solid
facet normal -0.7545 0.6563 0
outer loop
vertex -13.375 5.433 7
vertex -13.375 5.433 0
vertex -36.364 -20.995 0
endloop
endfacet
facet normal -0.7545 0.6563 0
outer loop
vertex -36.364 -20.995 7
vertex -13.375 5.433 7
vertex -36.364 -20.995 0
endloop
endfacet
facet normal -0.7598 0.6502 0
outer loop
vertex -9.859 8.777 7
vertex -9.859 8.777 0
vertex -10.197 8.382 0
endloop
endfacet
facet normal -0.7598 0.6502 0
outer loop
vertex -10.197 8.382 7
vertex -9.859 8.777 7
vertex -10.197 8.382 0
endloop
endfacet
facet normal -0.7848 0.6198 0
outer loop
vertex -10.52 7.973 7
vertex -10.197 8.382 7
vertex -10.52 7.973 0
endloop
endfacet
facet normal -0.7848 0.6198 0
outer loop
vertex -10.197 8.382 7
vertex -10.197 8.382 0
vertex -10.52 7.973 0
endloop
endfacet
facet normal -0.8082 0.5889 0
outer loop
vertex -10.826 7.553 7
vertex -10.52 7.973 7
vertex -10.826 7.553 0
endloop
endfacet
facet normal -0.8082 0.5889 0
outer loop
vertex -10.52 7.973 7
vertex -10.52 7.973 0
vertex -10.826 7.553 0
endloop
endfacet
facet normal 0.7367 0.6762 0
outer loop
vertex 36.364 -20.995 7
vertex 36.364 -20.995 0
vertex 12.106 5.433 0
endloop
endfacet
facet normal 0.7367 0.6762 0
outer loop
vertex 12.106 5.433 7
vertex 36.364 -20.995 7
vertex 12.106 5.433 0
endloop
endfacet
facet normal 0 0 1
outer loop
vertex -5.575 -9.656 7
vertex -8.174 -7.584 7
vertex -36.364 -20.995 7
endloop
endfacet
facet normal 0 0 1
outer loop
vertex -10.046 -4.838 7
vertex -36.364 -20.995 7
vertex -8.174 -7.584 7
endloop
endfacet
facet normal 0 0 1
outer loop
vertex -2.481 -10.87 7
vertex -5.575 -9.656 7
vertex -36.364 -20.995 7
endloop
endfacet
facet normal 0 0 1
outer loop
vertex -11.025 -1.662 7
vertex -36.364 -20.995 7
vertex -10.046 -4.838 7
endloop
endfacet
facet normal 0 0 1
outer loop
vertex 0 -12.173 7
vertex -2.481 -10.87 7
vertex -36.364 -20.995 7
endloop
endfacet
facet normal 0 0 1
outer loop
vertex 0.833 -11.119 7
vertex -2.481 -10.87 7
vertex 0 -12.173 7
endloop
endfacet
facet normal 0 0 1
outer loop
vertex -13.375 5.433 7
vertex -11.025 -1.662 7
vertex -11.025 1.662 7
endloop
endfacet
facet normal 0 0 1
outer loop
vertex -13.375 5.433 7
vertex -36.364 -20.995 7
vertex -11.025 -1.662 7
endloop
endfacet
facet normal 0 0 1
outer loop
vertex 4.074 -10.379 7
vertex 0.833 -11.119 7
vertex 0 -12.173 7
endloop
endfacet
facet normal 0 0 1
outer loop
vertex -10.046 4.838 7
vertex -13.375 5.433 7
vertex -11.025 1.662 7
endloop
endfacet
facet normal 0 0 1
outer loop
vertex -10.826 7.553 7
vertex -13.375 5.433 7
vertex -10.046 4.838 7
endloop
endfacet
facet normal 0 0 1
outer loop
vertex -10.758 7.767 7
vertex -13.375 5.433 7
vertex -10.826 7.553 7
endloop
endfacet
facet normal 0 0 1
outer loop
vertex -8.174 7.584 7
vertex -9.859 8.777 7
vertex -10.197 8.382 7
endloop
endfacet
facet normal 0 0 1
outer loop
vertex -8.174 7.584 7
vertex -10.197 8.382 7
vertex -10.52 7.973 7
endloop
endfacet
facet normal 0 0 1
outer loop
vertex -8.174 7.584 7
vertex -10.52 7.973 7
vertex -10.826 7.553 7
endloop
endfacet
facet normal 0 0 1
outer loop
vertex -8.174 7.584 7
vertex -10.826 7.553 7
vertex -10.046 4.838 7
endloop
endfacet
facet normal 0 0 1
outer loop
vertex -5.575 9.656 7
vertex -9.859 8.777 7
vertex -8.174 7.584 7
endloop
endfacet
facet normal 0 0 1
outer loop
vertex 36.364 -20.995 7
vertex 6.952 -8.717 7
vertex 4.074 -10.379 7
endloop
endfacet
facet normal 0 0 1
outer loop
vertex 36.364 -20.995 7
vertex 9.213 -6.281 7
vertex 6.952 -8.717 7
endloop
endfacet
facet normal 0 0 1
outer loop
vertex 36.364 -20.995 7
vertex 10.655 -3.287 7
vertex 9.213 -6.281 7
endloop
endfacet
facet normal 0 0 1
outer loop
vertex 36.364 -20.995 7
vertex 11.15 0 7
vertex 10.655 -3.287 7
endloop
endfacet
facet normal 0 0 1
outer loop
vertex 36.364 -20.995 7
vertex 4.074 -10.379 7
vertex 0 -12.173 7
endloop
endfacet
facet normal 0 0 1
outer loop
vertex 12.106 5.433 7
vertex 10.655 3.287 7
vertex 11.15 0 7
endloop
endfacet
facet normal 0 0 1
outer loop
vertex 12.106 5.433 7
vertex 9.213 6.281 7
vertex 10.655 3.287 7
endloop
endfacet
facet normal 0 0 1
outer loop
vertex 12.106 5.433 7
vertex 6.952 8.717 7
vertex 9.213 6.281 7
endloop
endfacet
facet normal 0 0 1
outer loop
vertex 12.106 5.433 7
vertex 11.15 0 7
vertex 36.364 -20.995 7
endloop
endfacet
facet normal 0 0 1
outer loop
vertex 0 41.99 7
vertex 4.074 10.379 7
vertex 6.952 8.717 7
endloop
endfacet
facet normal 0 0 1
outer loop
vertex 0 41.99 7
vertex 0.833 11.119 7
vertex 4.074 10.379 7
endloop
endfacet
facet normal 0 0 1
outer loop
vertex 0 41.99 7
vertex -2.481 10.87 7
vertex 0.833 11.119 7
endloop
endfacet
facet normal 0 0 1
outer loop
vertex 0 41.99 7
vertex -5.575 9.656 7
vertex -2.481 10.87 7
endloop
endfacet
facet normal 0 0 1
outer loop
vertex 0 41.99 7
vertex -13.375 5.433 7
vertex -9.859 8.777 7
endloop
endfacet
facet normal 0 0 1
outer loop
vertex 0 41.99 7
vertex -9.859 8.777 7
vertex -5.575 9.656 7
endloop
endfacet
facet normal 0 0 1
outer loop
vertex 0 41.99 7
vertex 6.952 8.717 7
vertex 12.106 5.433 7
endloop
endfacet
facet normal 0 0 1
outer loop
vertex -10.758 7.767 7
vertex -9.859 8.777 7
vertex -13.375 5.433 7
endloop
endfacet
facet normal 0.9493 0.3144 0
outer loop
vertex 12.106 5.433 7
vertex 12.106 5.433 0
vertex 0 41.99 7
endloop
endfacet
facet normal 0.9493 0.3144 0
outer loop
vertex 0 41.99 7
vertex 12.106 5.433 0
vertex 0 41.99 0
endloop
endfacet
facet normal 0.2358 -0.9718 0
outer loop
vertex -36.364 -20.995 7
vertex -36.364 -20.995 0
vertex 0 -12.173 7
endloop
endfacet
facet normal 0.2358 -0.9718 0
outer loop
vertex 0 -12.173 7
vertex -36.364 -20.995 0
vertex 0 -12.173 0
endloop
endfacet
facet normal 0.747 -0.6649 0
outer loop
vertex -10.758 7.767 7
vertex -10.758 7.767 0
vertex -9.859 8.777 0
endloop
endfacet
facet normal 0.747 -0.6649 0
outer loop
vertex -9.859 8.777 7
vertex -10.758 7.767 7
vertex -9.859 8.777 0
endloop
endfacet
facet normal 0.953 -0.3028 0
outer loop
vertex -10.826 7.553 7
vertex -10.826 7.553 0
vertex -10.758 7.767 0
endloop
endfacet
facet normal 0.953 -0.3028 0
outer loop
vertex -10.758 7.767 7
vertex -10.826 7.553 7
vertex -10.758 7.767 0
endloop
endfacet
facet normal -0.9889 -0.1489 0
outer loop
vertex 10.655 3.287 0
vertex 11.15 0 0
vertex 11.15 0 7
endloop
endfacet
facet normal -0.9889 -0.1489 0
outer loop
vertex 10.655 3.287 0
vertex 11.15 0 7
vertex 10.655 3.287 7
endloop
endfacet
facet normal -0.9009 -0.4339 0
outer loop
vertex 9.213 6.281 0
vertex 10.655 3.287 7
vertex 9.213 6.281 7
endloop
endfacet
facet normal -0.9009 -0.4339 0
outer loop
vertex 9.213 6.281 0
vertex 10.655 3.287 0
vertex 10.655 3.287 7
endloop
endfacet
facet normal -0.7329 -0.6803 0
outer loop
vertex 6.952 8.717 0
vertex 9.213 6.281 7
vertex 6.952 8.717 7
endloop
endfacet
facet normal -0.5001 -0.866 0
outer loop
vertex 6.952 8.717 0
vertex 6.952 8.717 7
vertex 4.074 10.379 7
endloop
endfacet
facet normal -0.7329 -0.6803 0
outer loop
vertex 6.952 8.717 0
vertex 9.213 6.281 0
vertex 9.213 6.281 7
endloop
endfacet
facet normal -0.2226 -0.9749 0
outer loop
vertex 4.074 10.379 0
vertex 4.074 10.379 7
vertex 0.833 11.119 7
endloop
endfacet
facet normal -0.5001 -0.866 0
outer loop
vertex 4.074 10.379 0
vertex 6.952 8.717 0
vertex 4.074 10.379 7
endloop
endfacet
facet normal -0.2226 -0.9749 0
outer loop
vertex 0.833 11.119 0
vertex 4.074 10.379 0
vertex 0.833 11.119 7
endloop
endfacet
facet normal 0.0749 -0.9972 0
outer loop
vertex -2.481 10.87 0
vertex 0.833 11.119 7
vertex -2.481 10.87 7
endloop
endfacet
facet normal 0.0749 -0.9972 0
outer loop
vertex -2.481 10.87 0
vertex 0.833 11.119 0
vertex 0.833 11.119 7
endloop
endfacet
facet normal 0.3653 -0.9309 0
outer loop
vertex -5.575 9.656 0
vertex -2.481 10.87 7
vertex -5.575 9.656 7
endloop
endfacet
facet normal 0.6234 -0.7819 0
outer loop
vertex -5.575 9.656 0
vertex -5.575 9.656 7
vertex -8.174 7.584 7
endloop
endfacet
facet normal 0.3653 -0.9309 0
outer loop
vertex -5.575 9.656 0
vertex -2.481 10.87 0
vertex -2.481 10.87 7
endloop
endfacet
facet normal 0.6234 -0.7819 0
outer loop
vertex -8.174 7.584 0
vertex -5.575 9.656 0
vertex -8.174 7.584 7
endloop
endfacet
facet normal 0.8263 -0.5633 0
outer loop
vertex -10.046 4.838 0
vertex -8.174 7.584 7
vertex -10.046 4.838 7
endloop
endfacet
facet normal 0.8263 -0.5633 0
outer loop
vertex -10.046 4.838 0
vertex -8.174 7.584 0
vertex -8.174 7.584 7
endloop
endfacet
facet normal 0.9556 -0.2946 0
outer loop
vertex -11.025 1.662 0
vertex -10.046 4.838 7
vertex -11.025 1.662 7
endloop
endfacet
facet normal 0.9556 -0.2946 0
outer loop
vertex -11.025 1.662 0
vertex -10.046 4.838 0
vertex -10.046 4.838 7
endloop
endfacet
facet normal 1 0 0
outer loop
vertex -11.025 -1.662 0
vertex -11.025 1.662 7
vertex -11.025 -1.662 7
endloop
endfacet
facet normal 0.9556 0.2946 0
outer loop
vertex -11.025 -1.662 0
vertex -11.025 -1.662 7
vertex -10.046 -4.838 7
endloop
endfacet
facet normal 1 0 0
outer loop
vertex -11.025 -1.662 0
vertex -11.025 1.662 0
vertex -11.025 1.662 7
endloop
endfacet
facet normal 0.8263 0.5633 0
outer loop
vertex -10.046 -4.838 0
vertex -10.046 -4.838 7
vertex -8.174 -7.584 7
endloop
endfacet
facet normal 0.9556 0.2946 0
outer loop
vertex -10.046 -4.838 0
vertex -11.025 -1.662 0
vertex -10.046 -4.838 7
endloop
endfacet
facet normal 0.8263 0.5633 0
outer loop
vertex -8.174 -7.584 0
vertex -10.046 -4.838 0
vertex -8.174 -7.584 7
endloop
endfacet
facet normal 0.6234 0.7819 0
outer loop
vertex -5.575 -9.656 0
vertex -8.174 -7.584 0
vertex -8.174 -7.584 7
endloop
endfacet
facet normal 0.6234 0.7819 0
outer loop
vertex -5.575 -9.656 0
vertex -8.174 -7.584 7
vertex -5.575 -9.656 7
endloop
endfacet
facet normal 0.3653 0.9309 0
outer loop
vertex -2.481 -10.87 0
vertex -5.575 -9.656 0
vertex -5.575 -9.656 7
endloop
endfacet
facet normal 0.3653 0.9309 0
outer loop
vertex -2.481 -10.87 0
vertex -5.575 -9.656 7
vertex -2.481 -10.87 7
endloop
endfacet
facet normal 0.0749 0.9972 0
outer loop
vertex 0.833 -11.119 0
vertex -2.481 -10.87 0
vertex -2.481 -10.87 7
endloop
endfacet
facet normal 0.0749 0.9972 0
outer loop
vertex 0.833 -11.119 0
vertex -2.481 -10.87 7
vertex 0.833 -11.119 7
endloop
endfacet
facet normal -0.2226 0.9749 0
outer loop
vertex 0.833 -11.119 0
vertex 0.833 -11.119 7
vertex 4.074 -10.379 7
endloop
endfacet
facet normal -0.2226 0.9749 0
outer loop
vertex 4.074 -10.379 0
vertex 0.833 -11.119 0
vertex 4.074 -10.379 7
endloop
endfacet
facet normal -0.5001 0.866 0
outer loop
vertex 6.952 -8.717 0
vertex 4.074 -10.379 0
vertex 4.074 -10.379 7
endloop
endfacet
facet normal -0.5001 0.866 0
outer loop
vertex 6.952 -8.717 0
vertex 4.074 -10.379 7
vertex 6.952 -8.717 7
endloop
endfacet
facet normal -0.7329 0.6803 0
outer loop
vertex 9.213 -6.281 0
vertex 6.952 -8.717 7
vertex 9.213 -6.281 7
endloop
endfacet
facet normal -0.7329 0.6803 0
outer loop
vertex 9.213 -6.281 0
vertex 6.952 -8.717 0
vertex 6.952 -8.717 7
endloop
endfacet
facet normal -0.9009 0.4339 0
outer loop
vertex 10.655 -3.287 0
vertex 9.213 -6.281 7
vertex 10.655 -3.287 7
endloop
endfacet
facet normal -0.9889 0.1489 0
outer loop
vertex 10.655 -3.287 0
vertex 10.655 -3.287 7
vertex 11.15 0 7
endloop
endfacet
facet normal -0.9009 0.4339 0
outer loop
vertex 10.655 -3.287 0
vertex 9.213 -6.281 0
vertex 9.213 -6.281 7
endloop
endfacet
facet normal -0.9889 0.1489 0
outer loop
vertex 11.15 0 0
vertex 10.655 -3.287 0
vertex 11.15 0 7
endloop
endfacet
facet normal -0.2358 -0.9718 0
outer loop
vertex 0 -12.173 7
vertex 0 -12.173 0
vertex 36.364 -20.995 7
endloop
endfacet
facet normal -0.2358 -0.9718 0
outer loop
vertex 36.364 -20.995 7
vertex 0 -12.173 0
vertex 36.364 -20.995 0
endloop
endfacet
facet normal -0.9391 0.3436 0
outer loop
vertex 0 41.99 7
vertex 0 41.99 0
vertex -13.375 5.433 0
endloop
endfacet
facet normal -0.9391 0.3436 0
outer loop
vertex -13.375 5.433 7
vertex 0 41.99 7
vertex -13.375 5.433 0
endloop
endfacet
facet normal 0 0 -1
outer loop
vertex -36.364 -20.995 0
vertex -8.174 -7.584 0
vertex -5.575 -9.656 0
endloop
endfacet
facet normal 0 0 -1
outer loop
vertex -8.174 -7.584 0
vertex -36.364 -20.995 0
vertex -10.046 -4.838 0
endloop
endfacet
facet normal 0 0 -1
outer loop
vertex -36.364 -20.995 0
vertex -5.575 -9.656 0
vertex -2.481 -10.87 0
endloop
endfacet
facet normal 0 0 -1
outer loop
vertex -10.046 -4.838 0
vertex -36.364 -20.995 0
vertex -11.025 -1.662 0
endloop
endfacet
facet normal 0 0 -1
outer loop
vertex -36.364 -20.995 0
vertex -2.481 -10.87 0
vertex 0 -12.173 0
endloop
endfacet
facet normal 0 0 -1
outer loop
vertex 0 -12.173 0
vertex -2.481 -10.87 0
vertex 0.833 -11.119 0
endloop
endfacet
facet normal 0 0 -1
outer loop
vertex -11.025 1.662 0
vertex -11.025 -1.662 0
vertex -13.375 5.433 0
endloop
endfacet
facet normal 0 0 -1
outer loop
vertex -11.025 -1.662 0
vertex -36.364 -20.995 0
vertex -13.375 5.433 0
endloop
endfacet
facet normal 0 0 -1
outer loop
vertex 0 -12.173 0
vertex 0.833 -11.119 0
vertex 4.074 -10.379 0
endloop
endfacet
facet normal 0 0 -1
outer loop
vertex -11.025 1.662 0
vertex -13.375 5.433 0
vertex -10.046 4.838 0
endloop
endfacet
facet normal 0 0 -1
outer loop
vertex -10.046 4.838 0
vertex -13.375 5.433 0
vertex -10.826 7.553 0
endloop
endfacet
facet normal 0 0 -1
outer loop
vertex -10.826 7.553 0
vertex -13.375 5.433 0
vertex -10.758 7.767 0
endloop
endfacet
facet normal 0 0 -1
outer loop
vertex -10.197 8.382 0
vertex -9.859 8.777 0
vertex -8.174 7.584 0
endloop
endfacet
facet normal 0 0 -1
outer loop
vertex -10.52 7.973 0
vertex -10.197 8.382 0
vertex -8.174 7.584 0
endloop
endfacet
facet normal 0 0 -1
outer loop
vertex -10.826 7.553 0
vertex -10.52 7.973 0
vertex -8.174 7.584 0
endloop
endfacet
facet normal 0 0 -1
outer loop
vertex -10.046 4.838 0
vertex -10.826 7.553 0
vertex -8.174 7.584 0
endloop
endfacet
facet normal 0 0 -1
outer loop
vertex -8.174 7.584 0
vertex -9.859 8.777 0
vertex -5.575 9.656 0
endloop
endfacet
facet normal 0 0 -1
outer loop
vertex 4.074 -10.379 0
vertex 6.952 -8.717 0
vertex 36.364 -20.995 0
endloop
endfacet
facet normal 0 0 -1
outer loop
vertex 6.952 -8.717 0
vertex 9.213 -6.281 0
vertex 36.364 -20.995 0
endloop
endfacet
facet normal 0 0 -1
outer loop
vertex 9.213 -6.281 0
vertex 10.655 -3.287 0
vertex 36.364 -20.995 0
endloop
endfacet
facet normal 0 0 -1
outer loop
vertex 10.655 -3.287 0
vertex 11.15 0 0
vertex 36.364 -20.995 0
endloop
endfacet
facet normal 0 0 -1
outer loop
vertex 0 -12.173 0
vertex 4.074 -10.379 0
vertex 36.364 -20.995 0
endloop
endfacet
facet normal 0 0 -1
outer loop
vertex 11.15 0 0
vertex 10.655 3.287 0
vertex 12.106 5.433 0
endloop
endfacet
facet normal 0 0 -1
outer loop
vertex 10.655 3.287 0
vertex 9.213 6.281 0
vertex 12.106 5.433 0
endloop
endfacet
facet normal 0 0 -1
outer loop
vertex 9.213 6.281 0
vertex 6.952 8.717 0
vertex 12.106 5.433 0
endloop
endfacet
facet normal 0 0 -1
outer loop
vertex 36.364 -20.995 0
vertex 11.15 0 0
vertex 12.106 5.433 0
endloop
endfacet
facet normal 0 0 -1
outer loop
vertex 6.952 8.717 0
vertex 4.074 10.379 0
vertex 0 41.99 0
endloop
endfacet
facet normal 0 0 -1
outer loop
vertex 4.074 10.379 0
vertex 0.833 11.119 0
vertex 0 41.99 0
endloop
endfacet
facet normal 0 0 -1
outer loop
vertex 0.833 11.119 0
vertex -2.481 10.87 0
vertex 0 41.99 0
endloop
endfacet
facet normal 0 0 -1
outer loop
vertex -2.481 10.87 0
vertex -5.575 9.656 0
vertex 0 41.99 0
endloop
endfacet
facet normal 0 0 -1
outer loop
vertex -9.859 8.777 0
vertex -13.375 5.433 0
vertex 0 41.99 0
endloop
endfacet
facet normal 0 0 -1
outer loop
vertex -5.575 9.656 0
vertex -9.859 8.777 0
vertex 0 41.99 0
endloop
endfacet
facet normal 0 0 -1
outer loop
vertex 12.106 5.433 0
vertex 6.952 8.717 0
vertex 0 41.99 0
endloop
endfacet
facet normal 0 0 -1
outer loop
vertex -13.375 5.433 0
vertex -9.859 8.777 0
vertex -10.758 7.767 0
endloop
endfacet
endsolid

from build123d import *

# Parameters (mm, degrees)
F0_R     = 11.15
F1_DEPTH = 7


with BuildPart() as f1:
    # F0 (on Top) → F1 (new body)
    with BuildSketch(Plane.XY):
        Polygon((12.105645, 5.433464), (0, 41.989982), (-13.375477, 5.433464), (-36.364391, -20.994991), (0, -12.173187), (36.364391, -20.994991), align=None)
        with BuildLine():
            ThreePointArc((-9.859029, 8.777217), (-10.360478, 8.179273), (-10.825715, 7.552741))
            Line((-10.825715, 7.552741), (-10.75834, 7.767064))
            Line((-10.75834, 7.767064), (-9.859029, 8.777217))
        make_face(mode=Mode.SUBTRACT)
        Circle(F0_R, mode=Mode.SUBTRACT)
    extrude(amount=F1_DEPTH)


solid = f1.part
